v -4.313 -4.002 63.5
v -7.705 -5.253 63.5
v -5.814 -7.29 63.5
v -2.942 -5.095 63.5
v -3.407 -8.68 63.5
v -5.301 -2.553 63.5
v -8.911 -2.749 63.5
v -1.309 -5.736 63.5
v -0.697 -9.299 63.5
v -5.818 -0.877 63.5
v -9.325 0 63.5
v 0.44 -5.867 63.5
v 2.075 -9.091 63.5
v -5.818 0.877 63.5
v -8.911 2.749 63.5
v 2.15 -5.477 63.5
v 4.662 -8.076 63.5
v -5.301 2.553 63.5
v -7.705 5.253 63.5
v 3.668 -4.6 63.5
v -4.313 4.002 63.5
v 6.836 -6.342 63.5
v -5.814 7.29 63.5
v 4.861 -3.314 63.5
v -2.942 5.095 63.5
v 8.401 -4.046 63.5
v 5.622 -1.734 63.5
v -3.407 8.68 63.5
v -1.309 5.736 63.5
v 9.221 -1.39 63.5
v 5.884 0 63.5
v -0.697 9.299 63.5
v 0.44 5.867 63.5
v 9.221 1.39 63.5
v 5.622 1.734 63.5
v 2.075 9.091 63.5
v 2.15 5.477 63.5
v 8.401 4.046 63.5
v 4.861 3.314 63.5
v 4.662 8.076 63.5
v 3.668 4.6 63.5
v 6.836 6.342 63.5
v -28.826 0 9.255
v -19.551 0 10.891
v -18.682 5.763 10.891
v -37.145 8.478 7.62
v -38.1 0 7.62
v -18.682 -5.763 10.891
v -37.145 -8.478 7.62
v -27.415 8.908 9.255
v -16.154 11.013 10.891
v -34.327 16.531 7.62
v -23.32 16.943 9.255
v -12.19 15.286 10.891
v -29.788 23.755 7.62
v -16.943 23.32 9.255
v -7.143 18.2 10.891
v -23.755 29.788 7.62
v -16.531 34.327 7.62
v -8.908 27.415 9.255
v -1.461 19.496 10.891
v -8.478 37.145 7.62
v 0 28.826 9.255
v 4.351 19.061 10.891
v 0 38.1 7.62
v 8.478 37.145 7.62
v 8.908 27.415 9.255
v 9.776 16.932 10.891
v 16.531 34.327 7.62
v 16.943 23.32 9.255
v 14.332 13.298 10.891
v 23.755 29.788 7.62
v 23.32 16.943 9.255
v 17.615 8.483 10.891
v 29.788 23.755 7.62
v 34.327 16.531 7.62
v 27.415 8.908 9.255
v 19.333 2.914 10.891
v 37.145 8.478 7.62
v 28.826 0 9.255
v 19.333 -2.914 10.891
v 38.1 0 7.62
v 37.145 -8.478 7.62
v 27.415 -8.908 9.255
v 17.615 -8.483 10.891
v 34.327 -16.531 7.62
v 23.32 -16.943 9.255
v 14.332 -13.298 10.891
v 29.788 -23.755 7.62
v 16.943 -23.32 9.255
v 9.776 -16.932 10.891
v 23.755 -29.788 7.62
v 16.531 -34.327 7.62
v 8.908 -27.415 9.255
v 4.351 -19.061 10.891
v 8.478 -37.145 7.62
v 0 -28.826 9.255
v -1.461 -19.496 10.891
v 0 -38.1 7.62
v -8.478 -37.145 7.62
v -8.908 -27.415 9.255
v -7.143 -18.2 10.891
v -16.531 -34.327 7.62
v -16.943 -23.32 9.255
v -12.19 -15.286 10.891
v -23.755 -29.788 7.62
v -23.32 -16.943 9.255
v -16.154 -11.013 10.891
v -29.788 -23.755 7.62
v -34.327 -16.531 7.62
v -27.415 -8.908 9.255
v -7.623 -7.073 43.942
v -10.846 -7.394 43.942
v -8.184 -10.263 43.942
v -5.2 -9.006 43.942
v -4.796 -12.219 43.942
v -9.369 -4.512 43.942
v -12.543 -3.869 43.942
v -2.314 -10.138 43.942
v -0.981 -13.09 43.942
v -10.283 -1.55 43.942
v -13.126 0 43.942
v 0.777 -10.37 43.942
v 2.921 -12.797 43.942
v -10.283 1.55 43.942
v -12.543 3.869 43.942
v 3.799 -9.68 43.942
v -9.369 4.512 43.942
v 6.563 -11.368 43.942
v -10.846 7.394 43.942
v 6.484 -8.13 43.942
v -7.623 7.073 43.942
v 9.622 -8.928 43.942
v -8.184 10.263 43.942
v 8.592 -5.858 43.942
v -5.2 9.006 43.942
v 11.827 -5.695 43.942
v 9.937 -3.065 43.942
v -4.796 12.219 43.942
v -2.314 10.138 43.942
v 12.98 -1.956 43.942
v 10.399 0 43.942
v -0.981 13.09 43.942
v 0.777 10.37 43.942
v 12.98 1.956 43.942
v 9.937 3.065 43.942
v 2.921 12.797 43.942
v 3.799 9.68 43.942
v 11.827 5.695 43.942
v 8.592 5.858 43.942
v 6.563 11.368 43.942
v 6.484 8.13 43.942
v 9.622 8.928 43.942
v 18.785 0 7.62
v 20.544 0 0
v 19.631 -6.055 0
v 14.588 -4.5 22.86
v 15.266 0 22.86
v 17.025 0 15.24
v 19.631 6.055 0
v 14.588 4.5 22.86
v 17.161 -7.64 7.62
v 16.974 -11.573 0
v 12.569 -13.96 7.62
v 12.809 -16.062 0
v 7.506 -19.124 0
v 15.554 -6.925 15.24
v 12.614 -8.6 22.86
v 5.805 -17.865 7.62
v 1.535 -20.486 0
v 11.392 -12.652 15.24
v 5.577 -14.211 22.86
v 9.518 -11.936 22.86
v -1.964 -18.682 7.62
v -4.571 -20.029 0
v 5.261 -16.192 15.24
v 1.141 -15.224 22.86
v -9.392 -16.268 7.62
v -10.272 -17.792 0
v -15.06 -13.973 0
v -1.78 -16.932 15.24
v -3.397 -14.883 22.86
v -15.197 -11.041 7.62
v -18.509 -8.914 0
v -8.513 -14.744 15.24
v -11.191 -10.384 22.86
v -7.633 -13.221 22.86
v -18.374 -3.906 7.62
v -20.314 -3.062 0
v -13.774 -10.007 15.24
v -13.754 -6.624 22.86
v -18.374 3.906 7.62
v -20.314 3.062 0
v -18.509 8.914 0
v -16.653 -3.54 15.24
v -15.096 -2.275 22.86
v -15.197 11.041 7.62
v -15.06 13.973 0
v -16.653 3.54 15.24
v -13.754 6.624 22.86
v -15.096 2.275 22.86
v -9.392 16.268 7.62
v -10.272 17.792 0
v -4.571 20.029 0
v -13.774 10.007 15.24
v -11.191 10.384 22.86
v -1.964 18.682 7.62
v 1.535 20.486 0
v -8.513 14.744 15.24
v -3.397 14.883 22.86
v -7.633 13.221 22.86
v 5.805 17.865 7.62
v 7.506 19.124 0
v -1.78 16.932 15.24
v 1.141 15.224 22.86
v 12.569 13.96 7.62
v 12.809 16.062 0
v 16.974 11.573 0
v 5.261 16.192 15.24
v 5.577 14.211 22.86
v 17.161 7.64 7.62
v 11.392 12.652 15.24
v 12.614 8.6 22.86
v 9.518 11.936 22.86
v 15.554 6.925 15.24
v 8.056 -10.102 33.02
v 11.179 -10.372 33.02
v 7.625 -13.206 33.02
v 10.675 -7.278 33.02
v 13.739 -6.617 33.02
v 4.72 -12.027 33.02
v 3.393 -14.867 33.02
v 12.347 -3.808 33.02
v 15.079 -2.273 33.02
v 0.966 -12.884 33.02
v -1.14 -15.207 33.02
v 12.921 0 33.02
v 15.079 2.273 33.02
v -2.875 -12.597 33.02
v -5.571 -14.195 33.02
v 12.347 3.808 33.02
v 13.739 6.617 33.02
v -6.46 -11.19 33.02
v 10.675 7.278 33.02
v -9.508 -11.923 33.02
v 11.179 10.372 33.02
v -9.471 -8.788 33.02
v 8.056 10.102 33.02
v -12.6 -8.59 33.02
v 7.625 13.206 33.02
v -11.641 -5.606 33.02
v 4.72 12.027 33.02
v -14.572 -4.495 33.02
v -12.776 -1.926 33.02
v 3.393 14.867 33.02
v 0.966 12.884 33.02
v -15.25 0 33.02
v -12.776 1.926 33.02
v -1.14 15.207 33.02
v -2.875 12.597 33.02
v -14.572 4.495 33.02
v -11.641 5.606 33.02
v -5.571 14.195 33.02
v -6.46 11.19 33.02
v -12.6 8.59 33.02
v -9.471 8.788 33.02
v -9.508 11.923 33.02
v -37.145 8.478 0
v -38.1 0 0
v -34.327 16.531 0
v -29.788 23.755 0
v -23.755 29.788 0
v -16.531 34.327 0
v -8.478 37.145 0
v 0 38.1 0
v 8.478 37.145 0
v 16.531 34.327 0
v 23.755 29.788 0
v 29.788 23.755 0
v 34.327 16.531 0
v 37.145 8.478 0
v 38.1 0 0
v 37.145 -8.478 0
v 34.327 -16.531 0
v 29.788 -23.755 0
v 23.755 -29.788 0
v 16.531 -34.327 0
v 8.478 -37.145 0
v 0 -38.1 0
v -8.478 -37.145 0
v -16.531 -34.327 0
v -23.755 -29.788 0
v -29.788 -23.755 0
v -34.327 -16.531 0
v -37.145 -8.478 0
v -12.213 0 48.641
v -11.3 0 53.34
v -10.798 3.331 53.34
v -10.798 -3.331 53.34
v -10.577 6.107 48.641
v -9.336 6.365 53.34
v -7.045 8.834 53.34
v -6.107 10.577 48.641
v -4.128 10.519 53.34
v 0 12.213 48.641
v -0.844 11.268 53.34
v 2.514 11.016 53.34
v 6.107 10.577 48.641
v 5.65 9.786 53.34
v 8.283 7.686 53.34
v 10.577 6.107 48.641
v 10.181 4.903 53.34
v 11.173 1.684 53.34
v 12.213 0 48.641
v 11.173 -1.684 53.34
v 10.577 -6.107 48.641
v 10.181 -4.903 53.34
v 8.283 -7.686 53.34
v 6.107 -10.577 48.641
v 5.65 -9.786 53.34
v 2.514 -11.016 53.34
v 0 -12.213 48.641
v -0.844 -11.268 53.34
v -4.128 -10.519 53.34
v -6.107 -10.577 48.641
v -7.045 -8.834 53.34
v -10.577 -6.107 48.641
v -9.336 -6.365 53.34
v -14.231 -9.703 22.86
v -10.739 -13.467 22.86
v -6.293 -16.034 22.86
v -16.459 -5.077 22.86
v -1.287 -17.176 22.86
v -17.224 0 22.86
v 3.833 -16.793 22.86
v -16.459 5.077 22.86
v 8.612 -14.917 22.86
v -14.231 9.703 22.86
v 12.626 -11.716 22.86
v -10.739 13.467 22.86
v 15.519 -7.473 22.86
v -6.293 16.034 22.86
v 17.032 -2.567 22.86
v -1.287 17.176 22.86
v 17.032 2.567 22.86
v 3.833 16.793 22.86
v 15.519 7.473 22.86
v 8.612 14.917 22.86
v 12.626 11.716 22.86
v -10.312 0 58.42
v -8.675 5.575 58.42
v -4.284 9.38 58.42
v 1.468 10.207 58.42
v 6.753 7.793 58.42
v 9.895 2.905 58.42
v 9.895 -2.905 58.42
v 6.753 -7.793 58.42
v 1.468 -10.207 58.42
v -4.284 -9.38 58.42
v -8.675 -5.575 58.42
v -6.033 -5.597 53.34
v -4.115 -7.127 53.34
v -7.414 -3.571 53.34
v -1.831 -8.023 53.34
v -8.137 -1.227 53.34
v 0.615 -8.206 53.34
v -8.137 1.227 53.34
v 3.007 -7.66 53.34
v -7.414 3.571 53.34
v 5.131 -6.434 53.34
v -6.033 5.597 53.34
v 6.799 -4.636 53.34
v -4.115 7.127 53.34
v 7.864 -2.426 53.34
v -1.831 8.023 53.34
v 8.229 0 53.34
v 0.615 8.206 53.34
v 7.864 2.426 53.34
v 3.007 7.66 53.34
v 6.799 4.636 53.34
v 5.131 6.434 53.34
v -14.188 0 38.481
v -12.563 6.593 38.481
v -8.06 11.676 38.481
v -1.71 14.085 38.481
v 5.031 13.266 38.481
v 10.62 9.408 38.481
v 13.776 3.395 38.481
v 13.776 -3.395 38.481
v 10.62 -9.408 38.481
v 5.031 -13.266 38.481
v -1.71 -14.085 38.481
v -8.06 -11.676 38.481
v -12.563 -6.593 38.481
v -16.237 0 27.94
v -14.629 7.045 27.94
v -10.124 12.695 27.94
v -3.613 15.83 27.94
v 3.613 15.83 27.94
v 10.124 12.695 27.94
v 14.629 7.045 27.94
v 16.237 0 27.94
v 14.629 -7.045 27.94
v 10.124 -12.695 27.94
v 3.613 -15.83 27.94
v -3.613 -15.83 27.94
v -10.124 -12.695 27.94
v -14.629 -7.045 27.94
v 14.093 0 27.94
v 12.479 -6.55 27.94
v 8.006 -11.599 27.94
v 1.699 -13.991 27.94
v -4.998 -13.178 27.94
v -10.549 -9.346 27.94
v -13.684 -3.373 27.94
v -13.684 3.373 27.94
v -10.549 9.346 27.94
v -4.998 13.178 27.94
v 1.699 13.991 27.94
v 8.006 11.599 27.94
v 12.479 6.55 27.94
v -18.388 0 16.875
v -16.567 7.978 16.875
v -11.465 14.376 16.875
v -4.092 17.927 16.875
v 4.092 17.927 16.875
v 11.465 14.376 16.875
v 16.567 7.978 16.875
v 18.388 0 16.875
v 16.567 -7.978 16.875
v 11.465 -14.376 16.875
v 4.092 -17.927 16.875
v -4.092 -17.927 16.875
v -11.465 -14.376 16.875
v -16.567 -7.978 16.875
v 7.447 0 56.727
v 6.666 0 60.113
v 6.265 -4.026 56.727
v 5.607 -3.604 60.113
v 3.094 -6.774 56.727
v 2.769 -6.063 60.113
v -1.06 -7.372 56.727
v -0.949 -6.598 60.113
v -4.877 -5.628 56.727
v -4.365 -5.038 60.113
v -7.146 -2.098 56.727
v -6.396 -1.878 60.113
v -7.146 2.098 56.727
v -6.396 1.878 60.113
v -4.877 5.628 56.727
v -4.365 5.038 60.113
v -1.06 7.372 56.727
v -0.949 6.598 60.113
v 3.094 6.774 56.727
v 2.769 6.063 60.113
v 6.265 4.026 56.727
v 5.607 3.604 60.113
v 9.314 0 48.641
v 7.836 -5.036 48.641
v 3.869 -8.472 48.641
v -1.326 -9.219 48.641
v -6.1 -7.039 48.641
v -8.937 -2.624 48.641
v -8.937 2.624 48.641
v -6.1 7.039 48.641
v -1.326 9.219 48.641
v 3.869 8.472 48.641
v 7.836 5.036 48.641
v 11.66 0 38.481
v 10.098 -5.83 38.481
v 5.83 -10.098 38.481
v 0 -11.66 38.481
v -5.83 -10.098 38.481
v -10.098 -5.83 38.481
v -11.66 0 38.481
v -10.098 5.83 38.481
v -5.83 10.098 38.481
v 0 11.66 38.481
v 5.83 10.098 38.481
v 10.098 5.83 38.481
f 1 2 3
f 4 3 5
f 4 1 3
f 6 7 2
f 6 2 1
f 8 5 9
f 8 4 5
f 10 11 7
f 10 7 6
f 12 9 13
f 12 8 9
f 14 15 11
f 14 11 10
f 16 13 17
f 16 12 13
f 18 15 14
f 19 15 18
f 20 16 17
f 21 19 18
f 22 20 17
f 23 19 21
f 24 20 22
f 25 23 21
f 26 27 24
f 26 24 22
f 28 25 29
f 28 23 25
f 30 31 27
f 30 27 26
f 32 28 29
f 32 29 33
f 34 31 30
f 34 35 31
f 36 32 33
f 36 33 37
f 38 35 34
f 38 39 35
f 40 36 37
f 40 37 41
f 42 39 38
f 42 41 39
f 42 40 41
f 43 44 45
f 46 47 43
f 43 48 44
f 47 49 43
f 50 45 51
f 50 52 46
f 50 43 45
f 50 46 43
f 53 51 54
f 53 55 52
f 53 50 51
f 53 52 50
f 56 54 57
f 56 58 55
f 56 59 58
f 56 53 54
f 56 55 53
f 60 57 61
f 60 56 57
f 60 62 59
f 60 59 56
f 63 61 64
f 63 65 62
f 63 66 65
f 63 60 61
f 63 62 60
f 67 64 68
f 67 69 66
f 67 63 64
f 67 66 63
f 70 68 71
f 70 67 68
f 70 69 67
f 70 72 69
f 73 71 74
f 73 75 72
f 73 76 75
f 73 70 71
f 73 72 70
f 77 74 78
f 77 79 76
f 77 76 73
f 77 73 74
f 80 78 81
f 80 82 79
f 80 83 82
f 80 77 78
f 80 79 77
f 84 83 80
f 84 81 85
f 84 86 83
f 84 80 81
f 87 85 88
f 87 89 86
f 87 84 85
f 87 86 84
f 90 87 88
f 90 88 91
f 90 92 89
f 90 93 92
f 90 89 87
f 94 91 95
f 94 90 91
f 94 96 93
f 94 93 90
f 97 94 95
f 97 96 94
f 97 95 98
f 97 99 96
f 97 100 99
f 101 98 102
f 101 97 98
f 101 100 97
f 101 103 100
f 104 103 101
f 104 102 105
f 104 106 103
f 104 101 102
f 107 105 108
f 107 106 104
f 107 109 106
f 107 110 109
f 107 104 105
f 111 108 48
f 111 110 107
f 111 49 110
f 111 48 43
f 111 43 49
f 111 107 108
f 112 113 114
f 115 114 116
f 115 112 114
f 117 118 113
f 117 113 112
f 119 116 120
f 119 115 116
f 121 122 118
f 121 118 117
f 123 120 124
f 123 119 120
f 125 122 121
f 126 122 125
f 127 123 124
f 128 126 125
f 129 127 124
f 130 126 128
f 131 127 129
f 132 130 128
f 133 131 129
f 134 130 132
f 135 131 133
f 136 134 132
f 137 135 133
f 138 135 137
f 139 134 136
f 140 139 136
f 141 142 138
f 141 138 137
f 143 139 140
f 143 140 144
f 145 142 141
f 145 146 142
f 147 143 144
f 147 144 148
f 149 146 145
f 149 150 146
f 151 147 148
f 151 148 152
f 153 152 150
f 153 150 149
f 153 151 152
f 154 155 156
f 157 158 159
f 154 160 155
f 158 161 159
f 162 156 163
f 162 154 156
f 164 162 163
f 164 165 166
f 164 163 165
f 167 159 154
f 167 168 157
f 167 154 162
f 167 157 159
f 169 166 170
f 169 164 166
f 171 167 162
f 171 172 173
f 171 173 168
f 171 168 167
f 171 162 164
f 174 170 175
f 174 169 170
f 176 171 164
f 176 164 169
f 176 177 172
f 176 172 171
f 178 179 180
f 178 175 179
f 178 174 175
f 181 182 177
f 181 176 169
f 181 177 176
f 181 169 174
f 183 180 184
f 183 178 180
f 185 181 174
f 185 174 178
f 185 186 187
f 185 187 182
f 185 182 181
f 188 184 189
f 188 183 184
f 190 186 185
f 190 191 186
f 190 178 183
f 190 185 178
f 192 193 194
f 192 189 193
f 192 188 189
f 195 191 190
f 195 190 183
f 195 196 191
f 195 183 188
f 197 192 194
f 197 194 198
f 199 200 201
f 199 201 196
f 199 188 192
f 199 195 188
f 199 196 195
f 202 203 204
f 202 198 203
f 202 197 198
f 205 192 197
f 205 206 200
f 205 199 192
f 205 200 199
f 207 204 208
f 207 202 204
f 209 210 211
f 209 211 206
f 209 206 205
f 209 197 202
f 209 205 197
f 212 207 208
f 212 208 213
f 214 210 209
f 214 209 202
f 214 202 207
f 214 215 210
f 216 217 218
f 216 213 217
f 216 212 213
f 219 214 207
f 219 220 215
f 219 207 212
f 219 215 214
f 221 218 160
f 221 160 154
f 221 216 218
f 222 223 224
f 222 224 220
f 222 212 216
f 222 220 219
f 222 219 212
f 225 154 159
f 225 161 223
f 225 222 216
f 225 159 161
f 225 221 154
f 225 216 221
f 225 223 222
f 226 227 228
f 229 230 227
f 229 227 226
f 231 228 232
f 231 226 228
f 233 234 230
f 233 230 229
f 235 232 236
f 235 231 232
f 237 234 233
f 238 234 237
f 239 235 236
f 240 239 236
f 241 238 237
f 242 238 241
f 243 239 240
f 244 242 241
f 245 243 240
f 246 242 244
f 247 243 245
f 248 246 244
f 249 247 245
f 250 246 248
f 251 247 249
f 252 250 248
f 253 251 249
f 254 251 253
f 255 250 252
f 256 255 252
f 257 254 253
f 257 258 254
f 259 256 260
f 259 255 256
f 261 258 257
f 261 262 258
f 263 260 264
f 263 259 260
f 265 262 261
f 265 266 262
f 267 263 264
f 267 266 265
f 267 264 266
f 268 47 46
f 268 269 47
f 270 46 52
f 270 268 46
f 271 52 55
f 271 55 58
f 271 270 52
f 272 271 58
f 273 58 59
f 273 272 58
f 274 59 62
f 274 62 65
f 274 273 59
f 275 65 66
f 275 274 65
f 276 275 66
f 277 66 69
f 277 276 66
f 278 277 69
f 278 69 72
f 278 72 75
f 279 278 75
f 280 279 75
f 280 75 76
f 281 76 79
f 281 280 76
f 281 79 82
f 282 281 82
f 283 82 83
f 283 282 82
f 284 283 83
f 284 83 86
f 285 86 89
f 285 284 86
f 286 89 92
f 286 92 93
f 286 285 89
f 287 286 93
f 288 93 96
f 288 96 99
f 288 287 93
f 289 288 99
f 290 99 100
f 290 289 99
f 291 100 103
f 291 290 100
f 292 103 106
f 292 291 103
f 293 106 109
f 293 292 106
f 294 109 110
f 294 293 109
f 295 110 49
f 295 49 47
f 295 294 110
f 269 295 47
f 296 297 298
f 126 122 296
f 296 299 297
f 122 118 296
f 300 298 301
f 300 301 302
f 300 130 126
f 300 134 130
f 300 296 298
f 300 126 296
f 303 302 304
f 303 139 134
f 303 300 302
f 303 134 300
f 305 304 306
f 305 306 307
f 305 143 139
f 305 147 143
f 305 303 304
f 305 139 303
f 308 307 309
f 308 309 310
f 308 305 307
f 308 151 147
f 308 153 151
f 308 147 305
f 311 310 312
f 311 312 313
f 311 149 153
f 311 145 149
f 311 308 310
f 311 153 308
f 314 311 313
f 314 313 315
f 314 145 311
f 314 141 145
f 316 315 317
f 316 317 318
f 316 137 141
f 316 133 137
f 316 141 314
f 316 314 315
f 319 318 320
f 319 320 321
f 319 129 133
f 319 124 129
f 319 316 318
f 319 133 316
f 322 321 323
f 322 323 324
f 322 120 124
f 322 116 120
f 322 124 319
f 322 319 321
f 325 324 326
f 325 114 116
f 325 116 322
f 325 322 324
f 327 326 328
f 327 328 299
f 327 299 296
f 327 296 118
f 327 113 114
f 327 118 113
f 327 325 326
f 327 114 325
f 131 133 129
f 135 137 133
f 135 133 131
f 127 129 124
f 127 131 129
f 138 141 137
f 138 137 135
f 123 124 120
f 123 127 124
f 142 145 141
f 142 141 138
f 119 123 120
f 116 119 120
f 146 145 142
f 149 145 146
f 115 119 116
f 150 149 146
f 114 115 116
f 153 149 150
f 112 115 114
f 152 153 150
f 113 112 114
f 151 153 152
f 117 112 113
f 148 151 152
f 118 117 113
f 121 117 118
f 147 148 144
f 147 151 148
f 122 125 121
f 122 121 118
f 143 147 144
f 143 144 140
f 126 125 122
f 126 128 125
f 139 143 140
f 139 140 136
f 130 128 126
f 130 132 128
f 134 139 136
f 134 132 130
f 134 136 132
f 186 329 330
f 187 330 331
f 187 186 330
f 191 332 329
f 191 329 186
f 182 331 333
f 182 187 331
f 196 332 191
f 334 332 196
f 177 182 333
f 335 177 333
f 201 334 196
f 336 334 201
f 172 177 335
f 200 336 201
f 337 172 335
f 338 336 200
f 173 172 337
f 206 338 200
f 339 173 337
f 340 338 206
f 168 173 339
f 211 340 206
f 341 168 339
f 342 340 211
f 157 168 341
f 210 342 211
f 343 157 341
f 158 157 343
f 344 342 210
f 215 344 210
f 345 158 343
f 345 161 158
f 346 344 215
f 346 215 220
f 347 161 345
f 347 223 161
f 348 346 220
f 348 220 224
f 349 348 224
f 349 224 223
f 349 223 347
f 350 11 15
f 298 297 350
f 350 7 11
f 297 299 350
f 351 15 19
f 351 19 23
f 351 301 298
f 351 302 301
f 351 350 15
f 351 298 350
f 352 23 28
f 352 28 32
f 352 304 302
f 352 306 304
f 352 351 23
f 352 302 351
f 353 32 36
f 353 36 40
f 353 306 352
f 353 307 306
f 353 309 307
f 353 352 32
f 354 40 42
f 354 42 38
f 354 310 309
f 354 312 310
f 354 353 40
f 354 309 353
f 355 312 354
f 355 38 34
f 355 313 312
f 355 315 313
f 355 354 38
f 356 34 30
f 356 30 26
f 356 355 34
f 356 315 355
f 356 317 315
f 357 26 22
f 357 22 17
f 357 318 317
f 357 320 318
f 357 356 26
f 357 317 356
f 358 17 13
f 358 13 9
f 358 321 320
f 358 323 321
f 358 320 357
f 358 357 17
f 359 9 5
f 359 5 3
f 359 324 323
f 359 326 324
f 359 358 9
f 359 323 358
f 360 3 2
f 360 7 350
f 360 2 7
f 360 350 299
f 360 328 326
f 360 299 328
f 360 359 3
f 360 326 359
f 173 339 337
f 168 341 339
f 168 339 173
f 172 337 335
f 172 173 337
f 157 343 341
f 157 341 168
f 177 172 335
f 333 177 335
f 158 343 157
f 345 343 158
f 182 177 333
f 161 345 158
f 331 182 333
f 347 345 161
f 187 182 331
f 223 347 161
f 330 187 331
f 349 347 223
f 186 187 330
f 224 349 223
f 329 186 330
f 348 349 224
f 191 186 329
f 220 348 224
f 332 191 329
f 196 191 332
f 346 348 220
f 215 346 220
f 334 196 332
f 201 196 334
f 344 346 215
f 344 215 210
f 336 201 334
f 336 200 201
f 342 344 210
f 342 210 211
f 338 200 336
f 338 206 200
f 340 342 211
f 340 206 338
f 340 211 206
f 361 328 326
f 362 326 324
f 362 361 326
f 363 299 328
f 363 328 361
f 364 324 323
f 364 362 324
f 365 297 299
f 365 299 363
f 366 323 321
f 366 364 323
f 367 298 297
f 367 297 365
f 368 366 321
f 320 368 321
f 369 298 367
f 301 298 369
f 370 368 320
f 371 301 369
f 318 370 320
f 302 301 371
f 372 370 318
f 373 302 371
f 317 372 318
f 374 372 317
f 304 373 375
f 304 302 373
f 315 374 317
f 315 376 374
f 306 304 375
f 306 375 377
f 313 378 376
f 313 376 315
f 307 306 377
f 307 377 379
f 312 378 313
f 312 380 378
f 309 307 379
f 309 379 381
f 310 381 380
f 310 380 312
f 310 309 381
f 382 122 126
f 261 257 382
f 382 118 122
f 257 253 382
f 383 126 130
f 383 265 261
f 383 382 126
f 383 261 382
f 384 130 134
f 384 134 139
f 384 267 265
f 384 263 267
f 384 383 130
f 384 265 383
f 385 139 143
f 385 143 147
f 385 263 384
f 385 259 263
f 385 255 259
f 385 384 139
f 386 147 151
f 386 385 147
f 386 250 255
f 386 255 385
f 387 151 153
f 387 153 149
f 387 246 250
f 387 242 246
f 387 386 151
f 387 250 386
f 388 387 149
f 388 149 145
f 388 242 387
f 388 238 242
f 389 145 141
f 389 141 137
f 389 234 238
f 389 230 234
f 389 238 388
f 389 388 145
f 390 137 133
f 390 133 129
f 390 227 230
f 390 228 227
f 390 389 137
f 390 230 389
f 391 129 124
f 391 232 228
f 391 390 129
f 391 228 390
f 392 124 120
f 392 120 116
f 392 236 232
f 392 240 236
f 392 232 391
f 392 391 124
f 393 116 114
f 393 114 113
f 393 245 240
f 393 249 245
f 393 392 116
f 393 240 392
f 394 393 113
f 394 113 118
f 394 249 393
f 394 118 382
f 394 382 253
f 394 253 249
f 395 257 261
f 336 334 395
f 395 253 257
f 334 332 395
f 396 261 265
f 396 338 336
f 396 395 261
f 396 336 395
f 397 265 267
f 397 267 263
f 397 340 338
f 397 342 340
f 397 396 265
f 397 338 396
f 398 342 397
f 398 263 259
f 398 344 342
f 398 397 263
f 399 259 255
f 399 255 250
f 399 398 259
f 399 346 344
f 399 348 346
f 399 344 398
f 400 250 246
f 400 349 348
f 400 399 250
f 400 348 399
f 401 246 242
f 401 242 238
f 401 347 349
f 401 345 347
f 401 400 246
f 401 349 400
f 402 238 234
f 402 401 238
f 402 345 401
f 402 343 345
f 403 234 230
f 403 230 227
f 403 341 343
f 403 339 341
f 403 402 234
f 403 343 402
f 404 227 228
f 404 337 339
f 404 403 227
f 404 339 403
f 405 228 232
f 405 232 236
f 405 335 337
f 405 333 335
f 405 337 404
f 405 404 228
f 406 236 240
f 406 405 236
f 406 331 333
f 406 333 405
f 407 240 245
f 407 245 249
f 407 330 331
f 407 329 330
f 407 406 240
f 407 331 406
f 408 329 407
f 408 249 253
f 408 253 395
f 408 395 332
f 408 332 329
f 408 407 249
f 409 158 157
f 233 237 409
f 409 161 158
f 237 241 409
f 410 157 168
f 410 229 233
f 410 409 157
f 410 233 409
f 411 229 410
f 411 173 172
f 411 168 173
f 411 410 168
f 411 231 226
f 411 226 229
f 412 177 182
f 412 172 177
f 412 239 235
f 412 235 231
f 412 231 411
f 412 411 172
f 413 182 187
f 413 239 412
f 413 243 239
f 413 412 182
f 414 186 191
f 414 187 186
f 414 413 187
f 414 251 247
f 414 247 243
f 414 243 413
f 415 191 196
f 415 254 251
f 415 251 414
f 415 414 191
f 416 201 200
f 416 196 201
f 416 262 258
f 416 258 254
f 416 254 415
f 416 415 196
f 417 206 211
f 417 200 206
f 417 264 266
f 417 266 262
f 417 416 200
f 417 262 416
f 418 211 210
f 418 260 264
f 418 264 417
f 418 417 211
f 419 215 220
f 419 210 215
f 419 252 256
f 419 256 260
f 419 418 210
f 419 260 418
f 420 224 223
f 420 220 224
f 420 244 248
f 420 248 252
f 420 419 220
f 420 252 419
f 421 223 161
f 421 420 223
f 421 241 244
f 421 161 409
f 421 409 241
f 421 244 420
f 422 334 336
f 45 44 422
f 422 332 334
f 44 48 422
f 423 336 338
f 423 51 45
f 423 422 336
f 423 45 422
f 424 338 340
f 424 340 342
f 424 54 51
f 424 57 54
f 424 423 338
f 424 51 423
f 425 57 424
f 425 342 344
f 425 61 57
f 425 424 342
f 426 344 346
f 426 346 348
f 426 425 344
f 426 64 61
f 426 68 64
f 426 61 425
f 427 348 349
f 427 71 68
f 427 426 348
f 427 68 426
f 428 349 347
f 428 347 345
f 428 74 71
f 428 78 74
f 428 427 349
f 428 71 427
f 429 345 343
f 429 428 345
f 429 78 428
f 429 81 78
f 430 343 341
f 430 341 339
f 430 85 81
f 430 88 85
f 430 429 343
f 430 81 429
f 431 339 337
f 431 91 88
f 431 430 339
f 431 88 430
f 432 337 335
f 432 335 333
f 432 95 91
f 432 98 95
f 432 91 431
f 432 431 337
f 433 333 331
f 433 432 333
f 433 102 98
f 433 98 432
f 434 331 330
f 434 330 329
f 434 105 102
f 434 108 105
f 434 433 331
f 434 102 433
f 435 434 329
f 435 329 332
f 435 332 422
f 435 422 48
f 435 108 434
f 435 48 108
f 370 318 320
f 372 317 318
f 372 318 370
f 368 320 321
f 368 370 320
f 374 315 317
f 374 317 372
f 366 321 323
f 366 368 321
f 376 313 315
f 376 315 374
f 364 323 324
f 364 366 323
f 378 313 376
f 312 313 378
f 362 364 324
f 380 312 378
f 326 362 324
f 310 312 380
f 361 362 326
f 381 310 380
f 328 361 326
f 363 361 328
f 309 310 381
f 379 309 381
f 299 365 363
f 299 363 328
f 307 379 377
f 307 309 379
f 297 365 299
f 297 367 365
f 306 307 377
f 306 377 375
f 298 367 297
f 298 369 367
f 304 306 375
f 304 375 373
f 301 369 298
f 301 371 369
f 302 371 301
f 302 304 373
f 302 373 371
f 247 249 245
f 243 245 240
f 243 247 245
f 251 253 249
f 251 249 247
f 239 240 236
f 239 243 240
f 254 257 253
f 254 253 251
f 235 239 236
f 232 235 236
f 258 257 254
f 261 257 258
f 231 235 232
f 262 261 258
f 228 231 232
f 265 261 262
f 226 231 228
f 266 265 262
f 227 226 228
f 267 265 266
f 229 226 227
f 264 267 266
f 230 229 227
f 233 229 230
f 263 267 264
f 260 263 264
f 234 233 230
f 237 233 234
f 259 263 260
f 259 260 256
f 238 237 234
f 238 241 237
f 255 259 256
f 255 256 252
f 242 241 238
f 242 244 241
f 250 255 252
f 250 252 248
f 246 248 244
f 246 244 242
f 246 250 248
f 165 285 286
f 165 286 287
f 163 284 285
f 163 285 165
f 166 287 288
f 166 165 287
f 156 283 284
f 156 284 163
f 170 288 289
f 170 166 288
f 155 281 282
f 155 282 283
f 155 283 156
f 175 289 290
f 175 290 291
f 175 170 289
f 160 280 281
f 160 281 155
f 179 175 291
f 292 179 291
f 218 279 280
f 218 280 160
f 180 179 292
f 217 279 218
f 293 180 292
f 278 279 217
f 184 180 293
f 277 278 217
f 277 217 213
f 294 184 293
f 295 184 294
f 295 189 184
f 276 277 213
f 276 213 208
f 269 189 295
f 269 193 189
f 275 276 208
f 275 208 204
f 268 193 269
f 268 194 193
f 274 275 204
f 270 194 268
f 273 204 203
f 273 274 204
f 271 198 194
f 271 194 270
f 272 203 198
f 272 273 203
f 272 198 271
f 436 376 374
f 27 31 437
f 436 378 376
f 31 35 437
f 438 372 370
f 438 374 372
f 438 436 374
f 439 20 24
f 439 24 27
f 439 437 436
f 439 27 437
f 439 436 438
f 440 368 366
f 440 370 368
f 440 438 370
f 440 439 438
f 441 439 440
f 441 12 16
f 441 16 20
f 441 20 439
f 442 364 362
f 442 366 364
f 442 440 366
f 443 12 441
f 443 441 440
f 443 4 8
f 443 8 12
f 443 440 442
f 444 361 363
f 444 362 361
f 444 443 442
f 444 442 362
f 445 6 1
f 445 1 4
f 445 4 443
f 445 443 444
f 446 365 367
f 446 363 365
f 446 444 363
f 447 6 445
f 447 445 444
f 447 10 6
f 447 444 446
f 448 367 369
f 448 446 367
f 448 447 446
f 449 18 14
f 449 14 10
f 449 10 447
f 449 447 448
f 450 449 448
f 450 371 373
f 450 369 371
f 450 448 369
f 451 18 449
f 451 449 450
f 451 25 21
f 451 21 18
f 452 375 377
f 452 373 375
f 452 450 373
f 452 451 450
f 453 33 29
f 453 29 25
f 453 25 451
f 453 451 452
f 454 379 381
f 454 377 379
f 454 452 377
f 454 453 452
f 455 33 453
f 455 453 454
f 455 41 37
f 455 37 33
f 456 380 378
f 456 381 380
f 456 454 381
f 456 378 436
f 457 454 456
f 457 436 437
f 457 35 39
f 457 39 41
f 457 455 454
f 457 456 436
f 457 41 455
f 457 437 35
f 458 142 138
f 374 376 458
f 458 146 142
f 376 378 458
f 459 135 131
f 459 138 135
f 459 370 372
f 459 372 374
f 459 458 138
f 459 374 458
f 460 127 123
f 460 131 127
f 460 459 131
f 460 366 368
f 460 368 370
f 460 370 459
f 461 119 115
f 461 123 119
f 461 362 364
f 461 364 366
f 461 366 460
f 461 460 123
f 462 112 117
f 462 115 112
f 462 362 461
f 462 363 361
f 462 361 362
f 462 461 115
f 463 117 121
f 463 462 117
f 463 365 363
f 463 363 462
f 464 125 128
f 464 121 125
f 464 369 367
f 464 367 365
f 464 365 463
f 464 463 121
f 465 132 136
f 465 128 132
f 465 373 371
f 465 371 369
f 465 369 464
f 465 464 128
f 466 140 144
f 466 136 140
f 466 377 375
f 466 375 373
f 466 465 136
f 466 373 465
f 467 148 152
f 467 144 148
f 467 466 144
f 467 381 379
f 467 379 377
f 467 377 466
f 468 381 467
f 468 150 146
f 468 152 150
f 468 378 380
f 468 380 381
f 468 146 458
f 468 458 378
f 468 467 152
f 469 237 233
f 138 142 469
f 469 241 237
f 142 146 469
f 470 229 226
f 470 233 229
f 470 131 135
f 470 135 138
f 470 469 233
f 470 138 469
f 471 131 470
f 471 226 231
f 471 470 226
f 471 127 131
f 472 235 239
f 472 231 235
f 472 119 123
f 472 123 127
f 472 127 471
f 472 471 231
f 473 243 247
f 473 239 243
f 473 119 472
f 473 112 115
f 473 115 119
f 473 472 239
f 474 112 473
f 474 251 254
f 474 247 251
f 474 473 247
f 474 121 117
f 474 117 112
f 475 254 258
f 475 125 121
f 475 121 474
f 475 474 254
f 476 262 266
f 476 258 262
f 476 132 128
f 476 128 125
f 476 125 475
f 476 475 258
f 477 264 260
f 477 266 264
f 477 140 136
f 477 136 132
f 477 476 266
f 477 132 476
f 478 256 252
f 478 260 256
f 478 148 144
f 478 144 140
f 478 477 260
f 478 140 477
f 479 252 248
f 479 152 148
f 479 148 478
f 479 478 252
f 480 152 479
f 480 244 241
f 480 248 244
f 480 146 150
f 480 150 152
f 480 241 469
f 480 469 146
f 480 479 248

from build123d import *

# Parameters (mm, degrees)
F6_R     = 20.5438566313
F7_DEPTH = 63.501
F7_TAPER = 13


with BuildPart() as f1:
    # F0 (on Front) → F1 (revolve)
    with BuildSketch(Plane.XZ):
        Polygon((-11.2996962615, 53.34), (0, 53.34), (0, 63.5), (-9.3247923207, 63.5), align=None)
    revolve(axis=Axis((0, 0, 31.75), (0, 0, -1)))


with BuildPart() as f2:
    # F0 (on Front) → F2 (revolve)
    with BuildSketch(Plane.XZ):
        Polygon((-13.1264824068, 43.942), (0, 43.942), (0, 53.34), (-11.2996962615, 53.34), align=None)
    revolve(axis=Axis((0, 0, 31.75), (0, 0, -1)))


with BuildPart() as f3:
    # F0 (on Front) → F3 (revolve)
    with BuildSketch(Plane.XZ):
        Polygon((-15.2495041432, 33.02), (0, 33.02), (0, 43.942), (-13.1264824068, 43.942), align=None)
    revolve(axis=Axis((0, 0, 31.75), (0, 0, -1)))


with BuildPart() as f4:
    # F0 (on Front) → F4 (revolve)
    with BuildSketch(Plane.XZ):
        Polygon((-17.224408084, 22.86), (0, 22.86), (0, 33.02), (-15.2495041432, 33.02), align=None)
    revolve(axis=Axis((0, 0, 31.75), (0, 0, -1)))


with BuildPart() as f5:
    # F0 (on Front) → F5 (revolve)
    with BuildSketch(Plane.XZ):
        Polygon((-38.1, 7.62), (-38.1, 0), (0, 0), (0, 22.86), (-17.224408084, 22.86), (-19.5510066523, 10.8906879922), align=None)
    revolve(axis=Axis((0, 0, 31.75), (0, 0, -1)))


with BuildPart() as f7_tool:
    # F6 (on face) → F7 (new body, through all)
    with BuildSketch(Plane(origin=(0, 0, 0), x_dir=(1, 0, 0), z_dir=(0, 0, -1))):
        Circle(F6_R)
    extrude(amount=-F7_DEPTH, taper=F7_TAPER)


with BuildPart() as f1_1:
    add(f1.part)

    # F7: cut by f7_tool
    add(f7_tool.part, mode=Mode.SUBTRACT)


with BuildPart() as f2_1:
    add(f2.part)

    # F7: cut by f7_tool
    add(f7_tool.part, mode=Mode.SUBTRACT)


with BuildPart() as f3_1:
    add(f3.part)

    # F7: cut by f7_tool
    add(f7_tool.part, mode=Mode.SUBTRACT)


with BuildPart() as f4_1:
    add(f4.part)

    # F7: cut by f7_tool
    add(f7_tool.part, mode=Mode.SUBTRACT)


with BuildPart() as f5_1:
    add(f5.part)

    # F7: cut by f7_tool
    add(f7_tool.part, mode=Mode.SUBTRACT)


solid = Compound([f1_1.part, f2_1.part, f3_1.part, f4_1.part, f5_1.part])
